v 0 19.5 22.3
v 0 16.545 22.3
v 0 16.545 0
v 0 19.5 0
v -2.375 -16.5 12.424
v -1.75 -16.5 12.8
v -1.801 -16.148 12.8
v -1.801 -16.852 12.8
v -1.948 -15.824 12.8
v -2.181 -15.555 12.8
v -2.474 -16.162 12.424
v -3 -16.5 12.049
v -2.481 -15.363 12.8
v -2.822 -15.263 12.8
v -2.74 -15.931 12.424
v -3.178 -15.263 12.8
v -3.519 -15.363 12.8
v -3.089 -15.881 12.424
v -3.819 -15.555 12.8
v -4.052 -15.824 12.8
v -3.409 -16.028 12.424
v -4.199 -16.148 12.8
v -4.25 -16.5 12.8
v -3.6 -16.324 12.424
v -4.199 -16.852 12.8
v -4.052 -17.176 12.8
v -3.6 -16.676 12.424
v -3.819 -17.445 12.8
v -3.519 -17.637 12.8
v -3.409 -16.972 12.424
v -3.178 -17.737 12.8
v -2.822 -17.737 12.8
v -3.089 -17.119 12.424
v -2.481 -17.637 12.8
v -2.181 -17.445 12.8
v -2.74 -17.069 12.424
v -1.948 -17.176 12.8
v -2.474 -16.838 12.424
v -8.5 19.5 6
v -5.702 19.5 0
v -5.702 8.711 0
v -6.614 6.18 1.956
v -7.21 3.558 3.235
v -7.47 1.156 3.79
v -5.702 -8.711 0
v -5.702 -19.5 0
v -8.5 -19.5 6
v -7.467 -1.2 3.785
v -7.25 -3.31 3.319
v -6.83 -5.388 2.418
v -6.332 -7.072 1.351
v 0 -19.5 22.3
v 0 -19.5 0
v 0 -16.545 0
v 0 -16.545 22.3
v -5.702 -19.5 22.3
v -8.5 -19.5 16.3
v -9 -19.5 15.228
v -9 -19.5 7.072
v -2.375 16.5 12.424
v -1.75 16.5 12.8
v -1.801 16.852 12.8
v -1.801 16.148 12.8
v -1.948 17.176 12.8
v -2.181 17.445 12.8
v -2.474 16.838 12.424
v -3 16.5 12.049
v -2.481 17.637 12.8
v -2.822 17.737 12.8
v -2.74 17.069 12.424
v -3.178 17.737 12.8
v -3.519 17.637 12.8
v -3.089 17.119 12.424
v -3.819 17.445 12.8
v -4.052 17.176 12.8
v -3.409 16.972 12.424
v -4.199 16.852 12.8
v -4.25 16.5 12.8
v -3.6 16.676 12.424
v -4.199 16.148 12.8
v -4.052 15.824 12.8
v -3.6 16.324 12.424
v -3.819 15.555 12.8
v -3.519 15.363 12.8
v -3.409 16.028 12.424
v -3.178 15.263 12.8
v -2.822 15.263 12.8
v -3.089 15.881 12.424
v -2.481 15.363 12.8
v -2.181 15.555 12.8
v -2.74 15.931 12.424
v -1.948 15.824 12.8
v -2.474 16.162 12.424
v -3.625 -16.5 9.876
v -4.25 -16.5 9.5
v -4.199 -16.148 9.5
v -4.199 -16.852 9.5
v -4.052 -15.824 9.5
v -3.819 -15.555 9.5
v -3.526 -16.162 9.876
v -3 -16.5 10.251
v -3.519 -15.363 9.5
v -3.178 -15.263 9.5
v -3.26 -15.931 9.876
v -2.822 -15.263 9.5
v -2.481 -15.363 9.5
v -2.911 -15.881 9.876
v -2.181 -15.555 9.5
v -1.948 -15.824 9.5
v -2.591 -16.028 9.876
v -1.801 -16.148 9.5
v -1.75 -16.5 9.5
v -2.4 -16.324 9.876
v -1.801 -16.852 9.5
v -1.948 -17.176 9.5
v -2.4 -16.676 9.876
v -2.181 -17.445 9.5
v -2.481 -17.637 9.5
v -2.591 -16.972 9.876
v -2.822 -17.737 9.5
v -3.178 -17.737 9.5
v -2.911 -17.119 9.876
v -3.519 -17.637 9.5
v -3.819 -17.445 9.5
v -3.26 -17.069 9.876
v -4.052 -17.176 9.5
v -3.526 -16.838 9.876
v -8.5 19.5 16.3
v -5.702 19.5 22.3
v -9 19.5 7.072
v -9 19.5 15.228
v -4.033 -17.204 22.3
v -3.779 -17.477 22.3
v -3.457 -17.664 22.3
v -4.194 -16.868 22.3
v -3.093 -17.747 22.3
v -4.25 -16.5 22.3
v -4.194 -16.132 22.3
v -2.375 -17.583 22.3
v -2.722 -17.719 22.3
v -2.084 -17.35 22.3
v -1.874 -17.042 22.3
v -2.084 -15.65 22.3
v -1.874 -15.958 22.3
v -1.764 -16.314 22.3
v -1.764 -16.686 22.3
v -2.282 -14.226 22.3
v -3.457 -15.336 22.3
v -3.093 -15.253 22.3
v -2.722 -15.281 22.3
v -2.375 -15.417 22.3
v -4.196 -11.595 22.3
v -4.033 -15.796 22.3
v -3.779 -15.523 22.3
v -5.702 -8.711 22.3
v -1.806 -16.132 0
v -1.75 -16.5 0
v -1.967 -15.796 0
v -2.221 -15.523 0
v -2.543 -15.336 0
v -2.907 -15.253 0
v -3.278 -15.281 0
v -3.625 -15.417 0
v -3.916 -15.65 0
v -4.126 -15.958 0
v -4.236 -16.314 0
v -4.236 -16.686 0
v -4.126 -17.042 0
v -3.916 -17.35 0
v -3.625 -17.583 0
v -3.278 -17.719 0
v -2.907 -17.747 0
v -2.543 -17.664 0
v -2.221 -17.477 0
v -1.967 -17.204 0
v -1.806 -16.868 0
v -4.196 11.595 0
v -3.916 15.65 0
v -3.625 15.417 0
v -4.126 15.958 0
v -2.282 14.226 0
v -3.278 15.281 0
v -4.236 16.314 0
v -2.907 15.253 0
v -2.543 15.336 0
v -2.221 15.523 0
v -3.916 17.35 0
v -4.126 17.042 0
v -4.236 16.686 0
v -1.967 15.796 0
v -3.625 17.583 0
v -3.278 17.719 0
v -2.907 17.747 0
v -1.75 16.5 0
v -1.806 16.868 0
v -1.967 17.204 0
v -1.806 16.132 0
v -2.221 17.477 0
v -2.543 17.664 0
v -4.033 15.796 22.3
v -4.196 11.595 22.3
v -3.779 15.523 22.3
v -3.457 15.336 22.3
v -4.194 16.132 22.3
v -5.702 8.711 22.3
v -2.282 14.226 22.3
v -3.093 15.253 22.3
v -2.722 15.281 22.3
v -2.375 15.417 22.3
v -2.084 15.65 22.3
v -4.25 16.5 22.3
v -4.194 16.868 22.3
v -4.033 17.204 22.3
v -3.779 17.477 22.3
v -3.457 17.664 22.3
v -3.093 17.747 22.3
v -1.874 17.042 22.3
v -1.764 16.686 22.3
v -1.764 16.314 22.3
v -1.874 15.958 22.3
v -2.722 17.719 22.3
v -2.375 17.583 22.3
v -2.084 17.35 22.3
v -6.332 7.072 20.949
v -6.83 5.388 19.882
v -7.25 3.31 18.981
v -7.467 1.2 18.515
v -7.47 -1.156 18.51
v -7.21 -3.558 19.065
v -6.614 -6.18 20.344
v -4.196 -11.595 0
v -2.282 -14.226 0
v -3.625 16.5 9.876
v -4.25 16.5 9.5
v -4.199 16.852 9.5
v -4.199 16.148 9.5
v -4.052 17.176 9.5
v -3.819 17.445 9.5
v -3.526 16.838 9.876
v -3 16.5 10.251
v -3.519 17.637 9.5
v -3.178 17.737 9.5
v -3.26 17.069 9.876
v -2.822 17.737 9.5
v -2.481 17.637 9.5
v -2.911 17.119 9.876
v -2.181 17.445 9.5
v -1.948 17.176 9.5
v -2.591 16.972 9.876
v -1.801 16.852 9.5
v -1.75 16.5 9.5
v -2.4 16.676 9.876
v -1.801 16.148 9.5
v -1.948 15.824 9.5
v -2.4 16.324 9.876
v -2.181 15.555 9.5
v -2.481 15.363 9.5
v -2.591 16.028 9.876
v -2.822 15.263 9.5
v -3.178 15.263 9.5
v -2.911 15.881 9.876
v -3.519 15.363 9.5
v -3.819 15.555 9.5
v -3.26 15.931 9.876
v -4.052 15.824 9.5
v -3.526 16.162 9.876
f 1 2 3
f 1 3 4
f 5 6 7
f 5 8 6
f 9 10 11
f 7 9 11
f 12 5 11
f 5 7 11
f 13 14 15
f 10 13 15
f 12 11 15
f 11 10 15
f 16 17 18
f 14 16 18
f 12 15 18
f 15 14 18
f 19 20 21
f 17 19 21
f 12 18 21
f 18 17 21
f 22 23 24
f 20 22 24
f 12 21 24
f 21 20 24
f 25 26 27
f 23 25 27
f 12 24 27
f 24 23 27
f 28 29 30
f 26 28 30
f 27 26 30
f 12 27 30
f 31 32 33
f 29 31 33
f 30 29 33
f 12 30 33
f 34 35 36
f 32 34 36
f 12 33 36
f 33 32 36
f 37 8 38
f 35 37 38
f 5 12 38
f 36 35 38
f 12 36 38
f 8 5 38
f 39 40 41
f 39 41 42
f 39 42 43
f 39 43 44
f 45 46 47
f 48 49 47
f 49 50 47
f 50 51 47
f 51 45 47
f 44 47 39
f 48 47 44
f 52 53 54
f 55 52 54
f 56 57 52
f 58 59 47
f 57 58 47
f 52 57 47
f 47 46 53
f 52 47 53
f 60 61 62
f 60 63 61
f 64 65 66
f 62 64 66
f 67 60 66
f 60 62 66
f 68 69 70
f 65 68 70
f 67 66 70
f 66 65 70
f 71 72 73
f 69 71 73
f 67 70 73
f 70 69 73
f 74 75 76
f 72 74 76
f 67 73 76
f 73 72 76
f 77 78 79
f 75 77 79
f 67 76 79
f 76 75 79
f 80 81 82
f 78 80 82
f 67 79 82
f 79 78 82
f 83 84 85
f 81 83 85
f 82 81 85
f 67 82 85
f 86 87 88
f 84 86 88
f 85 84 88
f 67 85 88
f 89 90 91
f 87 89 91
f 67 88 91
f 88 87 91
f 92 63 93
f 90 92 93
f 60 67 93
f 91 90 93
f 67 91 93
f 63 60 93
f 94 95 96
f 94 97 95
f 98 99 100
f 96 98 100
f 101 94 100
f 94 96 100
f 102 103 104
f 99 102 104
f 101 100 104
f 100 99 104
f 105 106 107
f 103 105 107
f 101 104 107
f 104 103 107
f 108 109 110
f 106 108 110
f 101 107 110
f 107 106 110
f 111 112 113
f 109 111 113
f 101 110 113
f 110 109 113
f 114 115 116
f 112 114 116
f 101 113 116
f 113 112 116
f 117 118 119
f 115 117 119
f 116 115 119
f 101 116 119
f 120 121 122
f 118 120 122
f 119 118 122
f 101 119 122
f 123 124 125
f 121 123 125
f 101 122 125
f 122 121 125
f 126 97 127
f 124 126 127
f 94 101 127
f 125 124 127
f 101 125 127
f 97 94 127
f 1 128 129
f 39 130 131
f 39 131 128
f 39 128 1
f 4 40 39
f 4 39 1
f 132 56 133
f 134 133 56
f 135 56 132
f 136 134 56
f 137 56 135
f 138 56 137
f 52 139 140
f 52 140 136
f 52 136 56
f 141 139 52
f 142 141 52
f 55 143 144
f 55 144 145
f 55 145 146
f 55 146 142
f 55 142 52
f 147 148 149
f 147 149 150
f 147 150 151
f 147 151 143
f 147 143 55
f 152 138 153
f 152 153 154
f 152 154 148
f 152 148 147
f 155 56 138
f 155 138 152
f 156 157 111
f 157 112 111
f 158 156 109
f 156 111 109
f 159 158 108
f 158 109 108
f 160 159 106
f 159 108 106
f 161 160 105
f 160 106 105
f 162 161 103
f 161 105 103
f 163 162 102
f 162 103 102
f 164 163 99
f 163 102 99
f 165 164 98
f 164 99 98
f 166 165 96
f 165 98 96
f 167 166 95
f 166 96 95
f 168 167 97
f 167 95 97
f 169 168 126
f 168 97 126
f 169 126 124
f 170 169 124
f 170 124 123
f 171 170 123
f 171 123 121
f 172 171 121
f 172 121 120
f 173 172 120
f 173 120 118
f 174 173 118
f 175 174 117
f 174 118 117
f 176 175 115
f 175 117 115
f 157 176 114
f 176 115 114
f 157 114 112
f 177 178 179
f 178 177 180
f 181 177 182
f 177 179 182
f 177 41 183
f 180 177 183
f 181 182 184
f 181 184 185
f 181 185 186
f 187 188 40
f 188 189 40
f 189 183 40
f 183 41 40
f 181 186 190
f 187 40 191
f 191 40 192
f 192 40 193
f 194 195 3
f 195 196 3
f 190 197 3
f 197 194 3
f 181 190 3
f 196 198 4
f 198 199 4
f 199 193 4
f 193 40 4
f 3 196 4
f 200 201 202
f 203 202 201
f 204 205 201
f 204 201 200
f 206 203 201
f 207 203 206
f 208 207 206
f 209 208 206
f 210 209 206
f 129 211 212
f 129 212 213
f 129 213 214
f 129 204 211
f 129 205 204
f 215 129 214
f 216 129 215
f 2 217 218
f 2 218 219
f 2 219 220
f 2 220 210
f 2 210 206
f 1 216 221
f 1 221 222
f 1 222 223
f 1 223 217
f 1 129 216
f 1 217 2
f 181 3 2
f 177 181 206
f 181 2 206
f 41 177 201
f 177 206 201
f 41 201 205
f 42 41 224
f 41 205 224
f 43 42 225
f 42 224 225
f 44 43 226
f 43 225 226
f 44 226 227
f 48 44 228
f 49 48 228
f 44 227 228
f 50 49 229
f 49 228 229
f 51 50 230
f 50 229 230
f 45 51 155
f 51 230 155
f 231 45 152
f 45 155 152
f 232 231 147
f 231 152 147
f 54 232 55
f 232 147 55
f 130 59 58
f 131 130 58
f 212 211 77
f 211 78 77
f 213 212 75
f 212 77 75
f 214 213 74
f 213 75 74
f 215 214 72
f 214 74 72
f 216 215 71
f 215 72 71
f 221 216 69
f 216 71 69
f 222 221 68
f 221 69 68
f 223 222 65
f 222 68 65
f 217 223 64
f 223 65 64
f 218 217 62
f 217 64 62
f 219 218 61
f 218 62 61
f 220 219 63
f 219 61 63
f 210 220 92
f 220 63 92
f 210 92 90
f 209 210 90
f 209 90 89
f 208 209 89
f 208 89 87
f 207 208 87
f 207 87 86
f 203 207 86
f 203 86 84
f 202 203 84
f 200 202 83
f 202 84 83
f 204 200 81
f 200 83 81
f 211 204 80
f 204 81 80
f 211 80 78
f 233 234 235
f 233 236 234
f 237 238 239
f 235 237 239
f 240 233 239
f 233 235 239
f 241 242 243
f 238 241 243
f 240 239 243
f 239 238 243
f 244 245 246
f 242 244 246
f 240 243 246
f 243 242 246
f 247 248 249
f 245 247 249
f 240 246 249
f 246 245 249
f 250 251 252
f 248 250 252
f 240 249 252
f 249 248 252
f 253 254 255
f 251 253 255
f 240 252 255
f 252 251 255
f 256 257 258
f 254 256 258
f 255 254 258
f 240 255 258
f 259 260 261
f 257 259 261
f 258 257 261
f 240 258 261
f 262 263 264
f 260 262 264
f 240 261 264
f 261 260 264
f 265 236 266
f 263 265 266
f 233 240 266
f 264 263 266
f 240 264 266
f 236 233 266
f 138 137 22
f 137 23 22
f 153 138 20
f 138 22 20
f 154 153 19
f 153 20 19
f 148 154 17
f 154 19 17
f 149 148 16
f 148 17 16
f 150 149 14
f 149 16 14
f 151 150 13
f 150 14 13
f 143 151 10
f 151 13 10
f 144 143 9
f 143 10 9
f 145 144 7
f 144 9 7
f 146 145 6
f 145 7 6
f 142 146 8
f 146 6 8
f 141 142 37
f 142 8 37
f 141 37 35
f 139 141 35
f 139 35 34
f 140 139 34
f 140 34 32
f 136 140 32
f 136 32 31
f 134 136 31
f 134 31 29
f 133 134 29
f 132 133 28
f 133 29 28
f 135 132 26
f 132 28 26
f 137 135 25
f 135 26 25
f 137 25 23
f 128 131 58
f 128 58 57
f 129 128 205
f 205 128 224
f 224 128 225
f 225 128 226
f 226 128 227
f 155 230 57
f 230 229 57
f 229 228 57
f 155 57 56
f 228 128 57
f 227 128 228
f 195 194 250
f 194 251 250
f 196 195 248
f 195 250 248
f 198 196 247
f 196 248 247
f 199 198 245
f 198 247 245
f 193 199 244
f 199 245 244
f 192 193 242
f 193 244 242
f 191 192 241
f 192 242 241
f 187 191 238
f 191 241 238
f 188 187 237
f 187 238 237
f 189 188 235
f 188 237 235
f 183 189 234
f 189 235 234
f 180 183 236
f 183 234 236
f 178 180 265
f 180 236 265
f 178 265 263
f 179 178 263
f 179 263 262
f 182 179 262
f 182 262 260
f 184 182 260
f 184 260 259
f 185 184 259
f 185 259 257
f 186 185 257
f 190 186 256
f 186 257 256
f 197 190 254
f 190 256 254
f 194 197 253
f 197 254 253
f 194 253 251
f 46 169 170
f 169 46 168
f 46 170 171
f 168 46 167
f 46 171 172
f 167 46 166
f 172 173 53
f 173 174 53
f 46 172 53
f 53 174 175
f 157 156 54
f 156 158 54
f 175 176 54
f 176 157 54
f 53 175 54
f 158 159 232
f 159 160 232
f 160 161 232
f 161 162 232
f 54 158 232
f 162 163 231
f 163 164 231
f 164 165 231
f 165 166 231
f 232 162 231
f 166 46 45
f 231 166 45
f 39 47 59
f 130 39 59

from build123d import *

# Parameters (mm, degrees)
SKETCH_1_W                       = 8.5
SKETCH_1_H                       = 39
EXTRUDE_1_DEPTH                  = 22.3
SKETCH_2_R                       = 22
CUT_EXTRUDE_2_DEPTH              = 22.3
HOLE_WIZARD_M3_1_D               = 2.5
HOLE_WIZARD_M3_1_DEPTH           = 9.5
HOLE_WIZARD_M3_1_TIP             = 0.751075774
HOLE_WIZARD_M3_2_D               = 2.5
HOLE_WIZARD_M3_2_DEPTH           = 9.5
HOLE_WIZARD_M3_2_TIP             = 0.751075774
HOLE_WIZARD_M3_3_D               = 2.5
HOLE_WIZARD_M3_3_DEPTH           = 9.5
HOLE_WIZARD_M3_3_TIP             = 0.751075774
HOLE_WIZARD_M3_3_ON_FACE_2_D     = 2.5
HOLE_WIZARD_M3_3_ON_FACE_2_DEPTH = 9.5
HOLE_WIZARD_M3_3_ON_FACE_2_TIP   = 0.751075774
CHAMFER_2_SIZE                   = 6
CHAMFER_2_SIZE_2                 = 2.797845949
CHAMFER_5_SIZE                   = 2.797845949
CHAMFER_5_SIZE_2                 = 6
EXTRUDE_5_DEPTH                  = 39


with BuildPart() as part:
    # 草图1 → 拉伸1 (new body)
    with BuildSketch(Plane.XY):
        with Locations((-4.25, 0)):
            Rectangle(SKETCH_1_W, SKETCH_1_H)
    extrude(amount=EXTRUDE_1_DEPTH)

    # 草图2 → 拉伸2 (cut)
    with BuildSketch(Plane.XY.offset(22.3)):
        with Locations((14.5, 0)):
            Circle(SKETCH_2_R)
    extrude(amount=-CUT_EXTRUDE_2_DEPTH, mode=Mode.SUBTRACT)

    # M3 螺纹孔1
    with Locations(Plane(origin=(-3, 16.5, 22.3), x_dir=(1, 0, 0), z_dir=(0, 0, 1))):
        with Locations((0, 0)):
            Hole(HOLE_WIZARD_M3_1_D / 2, depth=HOLE_WIZARD_M3_1_DEPTH)
            with Locations((0, 0, -(HOLE_WIZARD_M3_1_DEPTH + HOLE_WIZARD_M3_1_TIP / 2))):  # 118° drill point
                Cone(0, HOLE_WIZARD_M3_1_D / 2, HOLE_WIZARD_M3_1_TIP, mode=Mode.SUBTRACT)

    # M3 螺纹孔2
    with Locations(Plane(origin=(-3, 16.5, 0), x_dir=(-1, 0, 0), z_dir=(0, 0, -1))):
        with Locations((0, 0)):
            Hole(HOLE_WIZARD_M3_2_D / 2, depth=HOLE_WIZARD_M3_2_DEPTH)
            with Locations((0, 0, -(HOLE_WIZARD_M3_2_DEPTH + HOLE_WIZARD_M3_2_TIP / 2))):  # 118° drill point
                Cone(0, HOLE_WIZARD_M3_2_D / 2, HOLE_WIZARD_M3_2_TIP, mode=Mode.SUBTRACT)

    # M3 螺纹孔3
    with Locations(Plane(origin=(-3, -16.5, 22.3), x_dir=(1, 0, 0), z_dir=(0, 0, 1))):
        with Locations((0, 0)):
            Hole(HOLE_WIZARD_M3_3_D / 2, depth=HOLE_WIZARD_M3_3_DEPTH)
            with Locations((0, 0, -(HOLE_WIZARD_M3_3_DEPTH + HOLE_WIZARD_M3_3_TIP / 2))):  # 118° drill point
                Cone(0, HOLE_WIZARD_M3_3_D / 2, HOLE_WIZARD_M3_3_TIP, mode=Mode.SUBTRACT)

    # M3 螺纹孔3 on face 2
    with Locations(Plane(origin=(-3, -16.5, 0), x_dir=(-1, 0, 0), z_dir=(0, 0, -1))):
        with Locations((0, 0)):
            Hole(HOLE_WIZARD_M3_3_ON_FACE_2_D / 2, depth=HOLE_WIZARD_M3_3_ON_FACE_2_DEPTH)
            with Locations((0, 0, -(HOLE_WIZARD_M3_3_ON_FACE_2_DEPTH + HOLE_WIZARD_M3_3_ON_FACE_2_TIP / 2))):  # 118° drill point
                Cone(0, HOLE_WIZARD_M3_3_ON_FACE_2_D / 2, HOLE_WIZARD_M3_3_ON_FACE_2_TIP, mode=Mode.SUBTRACT)

    # 倒角2
    # the kernel refuses this chamfer: 6, 2.797845949 mm, written as the material it takes off along each edge
    with BuildSketch(Plane(origin=(-8.5, -35.045852829, 22.3), x_dir=(-0.01631116413111048, 0, -0.9998669641130704), z_dir=(0, 1, 0))) as chamfer_2_piece_1:
        Polygon((CHAMFER_2_SIZE * 0.999866964113, -CHAMFER_2_SIZE * 0.0163111641311), (-CHAMFER_2_SIZE_2 * 0.0163111641307, -CHAMFER_2_SIZE_2 * 0.999866964088), (0, 0), align=None)
    extrude(amount=70.091705657, mode=Mode.SUBTRACT)

    # 倒角5
    # the kernel refuses this chamfer: 6, 2.797845949 mm, written as the material it takes off along each edge
    with BuildSketch(Plane(origin=(-8.5, -35.045852829, 0), x_dir=(0.9971975577536775, 0, -0.07481330637059953), z_dir=(0, 1, 0))) as chamfer_5_piece_1:
        Polygon((CHAMFER_5_SIZE * 0.997197557729, -CHAMFER_5_SIZE * 0.0748133063687), (-CHAMFER_5_SIZE_2 * 0.0748133063706, -CHAMFER_5_SIZE_2 * 0.997197557754), (0, 0), align=None)
    extrude(amount=70.091705657, mode=Mode.SUBTRACT)

    # 草图8 → 拉伸5 (add)
    with BuildSketch(Plane(origin=(0, 19.5, 0), x_dir=(1, 0, 0), z_dir=(0, 1, 0))):
        Polygon((-8.5, -16.3), (-8.5, -6), (-9, -7.07225346), (-9, -15.22774654), align=None)
    extrude(amount=-EXTRUDE_5_DEPTH)


solid = part.part
